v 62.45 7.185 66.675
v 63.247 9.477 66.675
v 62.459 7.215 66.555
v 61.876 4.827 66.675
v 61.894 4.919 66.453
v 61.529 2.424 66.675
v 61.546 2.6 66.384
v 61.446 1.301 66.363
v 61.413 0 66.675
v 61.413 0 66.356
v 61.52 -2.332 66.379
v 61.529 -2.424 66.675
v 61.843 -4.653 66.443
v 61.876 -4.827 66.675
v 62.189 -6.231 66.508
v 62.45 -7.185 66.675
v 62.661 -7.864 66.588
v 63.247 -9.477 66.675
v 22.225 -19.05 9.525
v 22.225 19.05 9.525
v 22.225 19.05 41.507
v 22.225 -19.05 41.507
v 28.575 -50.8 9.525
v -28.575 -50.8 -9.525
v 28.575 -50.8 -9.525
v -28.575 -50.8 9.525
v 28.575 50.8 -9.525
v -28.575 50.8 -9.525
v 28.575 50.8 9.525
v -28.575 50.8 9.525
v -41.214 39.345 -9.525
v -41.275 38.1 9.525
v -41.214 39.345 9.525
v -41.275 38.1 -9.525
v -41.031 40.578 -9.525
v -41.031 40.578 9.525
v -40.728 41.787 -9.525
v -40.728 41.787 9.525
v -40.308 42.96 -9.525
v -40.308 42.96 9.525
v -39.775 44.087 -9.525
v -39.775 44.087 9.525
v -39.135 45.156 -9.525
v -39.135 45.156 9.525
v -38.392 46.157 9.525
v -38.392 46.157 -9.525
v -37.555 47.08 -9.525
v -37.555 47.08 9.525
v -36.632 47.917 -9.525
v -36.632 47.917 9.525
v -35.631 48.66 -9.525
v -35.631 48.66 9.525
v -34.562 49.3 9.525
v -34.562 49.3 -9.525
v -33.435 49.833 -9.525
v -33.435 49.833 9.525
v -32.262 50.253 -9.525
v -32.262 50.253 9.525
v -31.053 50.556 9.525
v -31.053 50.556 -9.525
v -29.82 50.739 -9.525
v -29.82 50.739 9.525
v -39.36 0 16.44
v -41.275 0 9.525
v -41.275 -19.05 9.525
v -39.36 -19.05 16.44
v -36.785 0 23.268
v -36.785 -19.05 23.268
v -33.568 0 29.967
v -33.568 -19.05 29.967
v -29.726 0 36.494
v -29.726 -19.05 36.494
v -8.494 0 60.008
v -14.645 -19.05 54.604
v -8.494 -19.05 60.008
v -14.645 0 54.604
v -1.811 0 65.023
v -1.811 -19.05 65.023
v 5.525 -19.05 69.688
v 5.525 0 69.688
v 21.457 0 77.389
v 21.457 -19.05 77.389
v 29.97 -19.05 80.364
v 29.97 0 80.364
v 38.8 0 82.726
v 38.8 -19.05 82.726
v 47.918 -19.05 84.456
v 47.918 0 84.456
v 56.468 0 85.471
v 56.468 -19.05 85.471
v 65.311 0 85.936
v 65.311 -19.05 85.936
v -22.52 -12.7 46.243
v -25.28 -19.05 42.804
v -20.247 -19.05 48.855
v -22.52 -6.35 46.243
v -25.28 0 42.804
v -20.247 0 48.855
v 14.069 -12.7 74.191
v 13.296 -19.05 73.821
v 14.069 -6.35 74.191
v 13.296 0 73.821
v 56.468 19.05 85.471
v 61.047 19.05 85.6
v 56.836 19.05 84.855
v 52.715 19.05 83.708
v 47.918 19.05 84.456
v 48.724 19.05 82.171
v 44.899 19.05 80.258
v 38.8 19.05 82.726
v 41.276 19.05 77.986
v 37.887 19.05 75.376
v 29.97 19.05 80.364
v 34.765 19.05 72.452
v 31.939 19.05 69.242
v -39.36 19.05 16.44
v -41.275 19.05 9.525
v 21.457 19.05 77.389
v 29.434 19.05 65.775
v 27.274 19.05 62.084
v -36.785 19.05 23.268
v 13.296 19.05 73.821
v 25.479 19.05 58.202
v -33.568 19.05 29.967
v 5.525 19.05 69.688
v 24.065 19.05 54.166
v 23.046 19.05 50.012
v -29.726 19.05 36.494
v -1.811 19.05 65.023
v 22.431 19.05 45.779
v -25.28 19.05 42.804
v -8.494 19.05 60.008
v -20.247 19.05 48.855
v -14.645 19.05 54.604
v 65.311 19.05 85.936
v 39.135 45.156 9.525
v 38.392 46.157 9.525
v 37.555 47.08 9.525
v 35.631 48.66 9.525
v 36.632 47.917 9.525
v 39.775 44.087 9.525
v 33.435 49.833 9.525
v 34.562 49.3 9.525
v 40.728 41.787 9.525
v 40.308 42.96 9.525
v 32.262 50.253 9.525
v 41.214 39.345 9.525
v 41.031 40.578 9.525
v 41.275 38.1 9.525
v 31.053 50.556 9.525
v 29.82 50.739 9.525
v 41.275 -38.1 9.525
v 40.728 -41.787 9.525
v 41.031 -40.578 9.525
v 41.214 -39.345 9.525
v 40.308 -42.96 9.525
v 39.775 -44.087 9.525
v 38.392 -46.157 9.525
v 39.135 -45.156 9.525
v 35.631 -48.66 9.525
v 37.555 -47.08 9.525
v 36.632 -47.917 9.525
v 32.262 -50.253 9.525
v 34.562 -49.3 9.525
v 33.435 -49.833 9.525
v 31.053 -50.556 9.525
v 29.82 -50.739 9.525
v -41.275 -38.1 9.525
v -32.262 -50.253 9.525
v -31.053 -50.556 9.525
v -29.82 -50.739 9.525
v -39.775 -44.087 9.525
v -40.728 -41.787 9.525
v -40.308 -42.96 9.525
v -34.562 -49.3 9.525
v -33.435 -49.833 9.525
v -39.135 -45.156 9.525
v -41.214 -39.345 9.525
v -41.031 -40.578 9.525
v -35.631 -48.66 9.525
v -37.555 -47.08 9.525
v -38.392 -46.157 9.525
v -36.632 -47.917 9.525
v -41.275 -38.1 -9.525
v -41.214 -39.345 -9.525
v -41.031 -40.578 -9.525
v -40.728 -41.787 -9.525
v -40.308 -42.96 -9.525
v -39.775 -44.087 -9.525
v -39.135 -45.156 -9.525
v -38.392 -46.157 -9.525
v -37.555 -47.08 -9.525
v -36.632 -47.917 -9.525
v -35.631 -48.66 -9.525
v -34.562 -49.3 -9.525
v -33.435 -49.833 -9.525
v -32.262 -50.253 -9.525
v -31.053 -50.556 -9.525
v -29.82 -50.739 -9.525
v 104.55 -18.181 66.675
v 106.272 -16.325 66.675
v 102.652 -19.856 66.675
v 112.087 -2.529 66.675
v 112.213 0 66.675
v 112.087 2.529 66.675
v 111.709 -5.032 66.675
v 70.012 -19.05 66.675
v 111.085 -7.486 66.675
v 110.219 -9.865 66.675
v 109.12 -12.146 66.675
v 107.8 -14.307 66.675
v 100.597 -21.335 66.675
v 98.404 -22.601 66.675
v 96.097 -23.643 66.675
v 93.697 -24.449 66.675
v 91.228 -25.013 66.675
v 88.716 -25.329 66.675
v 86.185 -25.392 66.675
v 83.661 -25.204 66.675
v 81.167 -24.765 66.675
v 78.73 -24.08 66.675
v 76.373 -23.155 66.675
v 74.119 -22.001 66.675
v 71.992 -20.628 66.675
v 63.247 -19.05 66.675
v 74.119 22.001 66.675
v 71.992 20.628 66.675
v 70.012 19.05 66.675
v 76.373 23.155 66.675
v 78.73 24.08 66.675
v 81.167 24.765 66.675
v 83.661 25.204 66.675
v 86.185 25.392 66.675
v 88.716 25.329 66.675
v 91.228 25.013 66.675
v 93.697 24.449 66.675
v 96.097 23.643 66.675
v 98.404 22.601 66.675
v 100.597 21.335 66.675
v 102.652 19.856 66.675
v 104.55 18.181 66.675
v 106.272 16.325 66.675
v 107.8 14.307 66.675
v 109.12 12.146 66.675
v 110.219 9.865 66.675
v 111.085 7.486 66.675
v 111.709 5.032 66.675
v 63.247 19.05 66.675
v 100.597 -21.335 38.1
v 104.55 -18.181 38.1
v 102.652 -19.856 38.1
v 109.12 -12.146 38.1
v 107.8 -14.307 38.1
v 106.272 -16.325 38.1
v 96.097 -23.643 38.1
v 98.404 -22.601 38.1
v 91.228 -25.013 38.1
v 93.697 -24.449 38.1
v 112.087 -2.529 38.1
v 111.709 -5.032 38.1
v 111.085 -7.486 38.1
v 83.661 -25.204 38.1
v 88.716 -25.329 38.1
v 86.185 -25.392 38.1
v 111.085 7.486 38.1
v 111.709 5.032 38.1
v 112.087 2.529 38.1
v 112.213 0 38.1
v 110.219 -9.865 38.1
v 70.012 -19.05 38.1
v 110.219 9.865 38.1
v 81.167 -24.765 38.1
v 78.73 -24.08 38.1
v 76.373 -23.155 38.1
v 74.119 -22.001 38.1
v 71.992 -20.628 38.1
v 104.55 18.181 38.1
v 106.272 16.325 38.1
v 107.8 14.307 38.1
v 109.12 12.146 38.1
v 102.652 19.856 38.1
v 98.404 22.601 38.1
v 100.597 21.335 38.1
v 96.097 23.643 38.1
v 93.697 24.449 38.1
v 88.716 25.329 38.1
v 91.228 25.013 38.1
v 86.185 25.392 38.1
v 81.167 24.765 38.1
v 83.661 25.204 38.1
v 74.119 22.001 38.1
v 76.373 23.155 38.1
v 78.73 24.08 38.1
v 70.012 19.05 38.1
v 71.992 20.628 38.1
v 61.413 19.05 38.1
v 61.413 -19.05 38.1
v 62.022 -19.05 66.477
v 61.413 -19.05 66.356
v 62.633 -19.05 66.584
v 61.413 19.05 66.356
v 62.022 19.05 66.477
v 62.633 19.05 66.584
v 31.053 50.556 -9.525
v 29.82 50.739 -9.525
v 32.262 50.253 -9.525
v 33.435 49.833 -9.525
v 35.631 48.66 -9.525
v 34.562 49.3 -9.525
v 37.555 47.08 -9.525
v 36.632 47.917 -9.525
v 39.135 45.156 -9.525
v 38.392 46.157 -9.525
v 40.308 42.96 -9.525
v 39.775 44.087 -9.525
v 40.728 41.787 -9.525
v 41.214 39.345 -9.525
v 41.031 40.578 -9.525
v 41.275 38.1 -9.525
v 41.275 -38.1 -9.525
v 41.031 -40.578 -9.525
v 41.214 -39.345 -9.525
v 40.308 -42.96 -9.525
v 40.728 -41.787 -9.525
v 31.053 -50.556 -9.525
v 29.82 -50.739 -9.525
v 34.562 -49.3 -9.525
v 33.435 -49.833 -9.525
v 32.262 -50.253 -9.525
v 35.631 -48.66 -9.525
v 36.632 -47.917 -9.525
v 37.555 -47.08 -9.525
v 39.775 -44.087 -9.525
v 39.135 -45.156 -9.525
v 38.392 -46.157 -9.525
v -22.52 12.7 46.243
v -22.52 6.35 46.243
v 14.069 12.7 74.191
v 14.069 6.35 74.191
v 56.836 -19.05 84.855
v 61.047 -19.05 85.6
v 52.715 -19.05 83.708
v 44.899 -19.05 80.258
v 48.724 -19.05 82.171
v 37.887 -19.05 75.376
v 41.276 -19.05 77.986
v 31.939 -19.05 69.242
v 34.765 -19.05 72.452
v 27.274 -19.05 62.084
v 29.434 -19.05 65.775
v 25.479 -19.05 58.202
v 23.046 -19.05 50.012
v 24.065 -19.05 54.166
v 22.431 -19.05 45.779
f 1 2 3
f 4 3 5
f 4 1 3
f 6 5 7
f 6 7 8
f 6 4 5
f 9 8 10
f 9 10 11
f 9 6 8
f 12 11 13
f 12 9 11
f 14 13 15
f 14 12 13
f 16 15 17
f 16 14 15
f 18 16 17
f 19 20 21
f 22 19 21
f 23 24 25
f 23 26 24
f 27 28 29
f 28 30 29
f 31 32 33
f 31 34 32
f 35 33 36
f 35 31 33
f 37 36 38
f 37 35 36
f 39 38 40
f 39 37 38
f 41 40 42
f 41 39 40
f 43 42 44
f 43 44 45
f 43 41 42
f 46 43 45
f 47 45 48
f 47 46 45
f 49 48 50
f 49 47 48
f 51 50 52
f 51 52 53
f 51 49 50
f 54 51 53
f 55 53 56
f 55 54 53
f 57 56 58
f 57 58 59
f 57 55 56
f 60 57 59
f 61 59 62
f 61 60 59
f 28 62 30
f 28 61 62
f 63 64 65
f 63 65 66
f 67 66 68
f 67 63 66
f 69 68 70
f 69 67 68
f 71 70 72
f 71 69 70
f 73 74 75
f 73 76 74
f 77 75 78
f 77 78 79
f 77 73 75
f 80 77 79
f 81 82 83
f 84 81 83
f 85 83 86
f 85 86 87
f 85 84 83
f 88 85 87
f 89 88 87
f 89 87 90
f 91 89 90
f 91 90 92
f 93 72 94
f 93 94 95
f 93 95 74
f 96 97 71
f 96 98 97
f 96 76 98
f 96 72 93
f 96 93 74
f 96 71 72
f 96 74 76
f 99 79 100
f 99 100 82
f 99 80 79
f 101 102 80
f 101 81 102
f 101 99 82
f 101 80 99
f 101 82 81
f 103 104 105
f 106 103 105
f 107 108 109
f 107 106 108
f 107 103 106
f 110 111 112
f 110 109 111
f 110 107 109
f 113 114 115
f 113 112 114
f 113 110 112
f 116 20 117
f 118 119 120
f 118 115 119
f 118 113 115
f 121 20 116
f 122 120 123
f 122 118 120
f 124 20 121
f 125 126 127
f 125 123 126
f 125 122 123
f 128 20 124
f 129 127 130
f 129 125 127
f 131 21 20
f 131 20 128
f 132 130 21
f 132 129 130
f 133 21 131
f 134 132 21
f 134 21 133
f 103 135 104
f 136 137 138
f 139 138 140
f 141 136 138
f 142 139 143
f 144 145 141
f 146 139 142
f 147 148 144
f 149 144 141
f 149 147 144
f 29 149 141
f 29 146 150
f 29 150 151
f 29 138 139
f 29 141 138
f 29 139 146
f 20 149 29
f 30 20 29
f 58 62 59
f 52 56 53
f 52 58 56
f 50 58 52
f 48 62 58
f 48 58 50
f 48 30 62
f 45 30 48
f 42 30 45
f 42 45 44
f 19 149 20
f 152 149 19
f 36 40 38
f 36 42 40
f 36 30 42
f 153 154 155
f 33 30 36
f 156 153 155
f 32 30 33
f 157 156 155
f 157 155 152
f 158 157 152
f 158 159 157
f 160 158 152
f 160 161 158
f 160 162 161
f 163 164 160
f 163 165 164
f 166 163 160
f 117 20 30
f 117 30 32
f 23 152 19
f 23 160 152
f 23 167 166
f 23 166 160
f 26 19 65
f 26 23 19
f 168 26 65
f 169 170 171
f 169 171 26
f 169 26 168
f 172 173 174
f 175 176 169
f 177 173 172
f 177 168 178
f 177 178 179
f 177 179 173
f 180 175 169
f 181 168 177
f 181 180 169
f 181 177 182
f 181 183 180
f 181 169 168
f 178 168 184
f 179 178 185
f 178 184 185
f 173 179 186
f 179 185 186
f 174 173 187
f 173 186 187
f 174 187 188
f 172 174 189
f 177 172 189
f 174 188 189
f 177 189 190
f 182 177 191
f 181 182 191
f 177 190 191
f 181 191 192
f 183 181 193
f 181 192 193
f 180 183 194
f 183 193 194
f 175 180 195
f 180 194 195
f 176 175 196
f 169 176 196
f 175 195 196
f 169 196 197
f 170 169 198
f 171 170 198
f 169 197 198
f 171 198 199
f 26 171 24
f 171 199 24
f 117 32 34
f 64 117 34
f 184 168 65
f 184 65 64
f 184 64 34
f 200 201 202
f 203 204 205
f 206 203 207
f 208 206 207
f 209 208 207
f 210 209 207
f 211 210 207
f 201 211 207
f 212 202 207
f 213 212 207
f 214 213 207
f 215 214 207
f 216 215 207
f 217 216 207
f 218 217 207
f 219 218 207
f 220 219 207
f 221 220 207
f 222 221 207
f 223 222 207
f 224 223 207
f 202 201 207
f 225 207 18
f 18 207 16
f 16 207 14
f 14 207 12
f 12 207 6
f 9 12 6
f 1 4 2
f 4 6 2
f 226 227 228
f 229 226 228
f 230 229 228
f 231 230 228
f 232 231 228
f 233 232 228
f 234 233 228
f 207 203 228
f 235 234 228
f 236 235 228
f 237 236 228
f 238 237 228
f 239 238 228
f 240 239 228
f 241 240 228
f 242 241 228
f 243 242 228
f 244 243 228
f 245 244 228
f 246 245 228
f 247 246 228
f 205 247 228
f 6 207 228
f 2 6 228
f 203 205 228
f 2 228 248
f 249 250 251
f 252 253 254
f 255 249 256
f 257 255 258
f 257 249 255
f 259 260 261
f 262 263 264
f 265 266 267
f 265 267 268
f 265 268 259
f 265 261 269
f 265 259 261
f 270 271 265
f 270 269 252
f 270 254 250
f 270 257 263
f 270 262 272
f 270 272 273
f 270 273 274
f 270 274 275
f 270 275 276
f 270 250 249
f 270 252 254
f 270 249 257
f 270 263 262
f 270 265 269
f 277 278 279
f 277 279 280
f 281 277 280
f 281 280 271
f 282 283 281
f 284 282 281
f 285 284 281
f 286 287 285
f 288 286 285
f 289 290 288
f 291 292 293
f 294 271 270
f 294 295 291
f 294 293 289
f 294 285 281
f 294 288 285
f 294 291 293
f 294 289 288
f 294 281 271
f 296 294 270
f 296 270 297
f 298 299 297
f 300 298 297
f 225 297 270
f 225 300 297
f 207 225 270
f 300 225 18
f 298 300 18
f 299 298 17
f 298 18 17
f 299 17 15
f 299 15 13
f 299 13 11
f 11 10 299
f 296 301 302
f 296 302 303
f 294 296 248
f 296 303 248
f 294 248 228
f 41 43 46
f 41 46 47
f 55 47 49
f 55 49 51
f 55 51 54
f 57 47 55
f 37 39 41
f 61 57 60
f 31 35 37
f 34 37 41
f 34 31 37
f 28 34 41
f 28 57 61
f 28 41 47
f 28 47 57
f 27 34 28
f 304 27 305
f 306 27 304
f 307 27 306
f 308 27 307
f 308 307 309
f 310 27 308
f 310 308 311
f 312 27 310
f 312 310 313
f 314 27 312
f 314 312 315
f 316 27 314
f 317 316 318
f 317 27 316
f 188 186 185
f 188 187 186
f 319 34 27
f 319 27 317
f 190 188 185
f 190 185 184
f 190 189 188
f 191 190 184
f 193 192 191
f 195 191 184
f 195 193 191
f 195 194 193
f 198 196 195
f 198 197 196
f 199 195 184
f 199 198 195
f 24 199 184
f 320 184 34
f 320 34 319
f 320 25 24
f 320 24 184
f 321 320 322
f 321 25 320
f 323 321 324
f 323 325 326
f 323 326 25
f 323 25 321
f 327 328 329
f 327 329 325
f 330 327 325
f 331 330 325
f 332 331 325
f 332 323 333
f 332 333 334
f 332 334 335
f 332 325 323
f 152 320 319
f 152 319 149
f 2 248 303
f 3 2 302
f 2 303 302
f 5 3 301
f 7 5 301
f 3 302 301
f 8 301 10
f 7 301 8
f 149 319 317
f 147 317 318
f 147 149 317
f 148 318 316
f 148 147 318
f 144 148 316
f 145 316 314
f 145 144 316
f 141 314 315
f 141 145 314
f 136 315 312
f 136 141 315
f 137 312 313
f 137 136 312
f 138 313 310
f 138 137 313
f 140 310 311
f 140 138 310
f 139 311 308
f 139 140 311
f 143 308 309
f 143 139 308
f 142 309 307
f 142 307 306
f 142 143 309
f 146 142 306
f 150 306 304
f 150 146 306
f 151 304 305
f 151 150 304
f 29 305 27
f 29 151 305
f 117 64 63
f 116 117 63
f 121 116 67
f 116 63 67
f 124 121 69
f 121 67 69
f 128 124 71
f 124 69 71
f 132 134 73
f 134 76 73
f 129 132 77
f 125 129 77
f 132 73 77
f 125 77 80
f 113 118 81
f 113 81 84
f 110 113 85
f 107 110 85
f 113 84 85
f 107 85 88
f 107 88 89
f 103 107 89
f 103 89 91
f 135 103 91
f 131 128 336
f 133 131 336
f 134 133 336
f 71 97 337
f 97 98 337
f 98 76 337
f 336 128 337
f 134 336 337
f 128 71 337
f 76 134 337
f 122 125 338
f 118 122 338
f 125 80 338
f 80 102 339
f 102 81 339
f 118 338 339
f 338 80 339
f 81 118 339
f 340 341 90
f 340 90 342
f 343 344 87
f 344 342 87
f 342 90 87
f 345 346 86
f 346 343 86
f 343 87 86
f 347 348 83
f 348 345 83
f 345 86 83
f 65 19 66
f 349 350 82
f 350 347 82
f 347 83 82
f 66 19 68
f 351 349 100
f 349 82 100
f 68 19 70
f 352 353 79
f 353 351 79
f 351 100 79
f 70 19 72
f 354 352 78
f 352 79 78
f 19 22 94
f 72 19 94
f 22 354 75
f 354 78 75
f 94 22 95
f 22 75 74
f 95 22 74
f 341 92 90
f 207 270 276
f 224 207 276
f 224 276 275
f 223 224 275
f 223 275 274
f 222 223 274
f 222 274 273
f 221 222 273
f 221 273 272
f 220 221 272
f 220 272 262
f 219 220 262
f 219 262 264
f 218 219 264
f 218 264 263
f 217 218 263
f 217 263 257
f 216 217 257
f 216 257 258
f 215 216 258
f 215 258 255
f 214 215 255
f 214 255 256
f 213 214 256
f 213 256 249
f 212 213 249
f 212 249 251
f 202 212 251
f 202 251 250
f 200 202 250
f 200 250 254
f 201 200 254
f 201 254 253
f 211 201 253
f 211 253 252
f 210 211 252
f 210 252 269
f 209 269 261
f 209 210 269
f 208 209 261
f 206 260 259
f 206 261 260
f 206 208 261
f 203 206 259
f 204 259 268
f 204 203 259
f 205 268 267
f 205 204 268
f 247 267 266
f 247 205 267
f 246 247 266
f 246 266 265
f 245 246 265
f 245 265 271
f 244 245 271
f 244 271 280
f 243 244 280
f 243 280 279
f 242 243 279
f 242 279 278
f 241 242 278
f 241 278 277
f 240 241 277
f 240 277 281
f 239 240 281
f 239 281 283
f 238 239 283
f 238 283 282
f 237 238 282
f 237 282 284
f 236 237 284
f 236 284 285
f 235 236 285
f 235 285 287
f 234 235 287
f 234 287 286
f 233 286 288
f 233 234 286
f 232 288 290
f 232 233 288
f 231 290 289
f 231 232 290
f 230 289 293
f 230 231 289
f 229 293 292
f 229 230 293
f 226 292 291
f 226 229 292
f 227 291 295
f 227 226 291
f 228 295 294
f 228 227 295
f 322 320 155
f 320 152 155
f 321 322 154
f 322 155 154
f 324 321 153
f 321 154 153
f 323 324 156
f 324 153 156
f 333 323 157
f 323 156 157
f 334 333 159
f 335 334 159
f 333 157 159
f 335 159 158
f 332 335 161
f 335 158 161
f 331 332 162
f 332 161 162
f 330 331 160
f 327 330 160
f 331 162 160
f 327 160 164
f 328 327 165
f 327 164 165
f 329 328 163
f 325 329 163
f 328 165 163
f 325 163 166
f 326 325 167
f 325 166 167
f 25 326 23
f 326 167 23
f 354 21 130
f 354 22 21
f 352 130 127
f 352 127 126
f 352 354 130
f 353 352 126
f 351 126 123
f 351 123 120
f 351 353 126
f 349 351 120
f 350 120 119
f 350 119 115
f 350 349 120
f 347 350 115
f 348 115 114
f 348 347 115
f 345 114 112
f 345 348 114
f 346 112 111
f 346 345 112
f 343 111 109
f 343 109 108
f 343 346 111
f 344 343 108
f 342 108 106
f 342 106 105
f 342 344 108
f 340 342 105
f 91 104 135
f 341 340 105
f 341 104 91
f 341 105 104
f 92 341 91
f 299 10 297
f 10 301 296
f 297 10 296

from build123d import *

# Parameters (mm, degrees)
F1_DEPTH = 50.8
F2_DEPTH = 19.05
F0_W     = 25.4
F0_H     = 28.575
F4_R     = 12.7


with BuildPart() as f1:
    # F0 (on Front) → F1 (new body, symmetric)
    with BuildSketch(Plane.XZ):
        Polygon((-41.275, 9.525), (-41.275, -9.525), (41.275, -9.525), (41.275, 9.525), (22.225, 9.525), align=None)
    extrude(amount=F1_DEPTH, both=True)

    # F0 (on Front) → F2 (join, symmetric)
    with BuildSketch(Plane.XZ):
        with BuildLine():
            ThreePointArc((63.247054, 66.675), (62.327, 66.532463), (61.412787, 66.356304))
            Line((61.412787, 66.356304), (61.412787, 38.1))
            Line((61.412787, 38.1), (86.812787, 38.1))
            Line((86.812787, 38.1), (86.812787, 66.675))
            Line((86.812787, 66.675), (63.247054, 66.675))
        make_face()
        with BuildLine():
            add(Edge.make_bspline(
                [(-41.275, 9.525), (-32.496811, 48.148703), (7.801794, 84.771397), (65.310965, 85.936444)],
                knots=[0, 0, 0, 0, 131.233963, 131.233963, 131.233963, 131.233963], degree=3))
            Line((-41.275, 9.525), (22.225, 9.525))
            Line((22.225, 9.525), (22.225, 41.507378))
            ThreePointArc((22.225, 41.507378), (34.765489, 72.452258), (65.310965, 85.936444))
        make_face()
    extrude(amount=F2_DEPTH, both=True)

    # F0 (on Front) → F3 (revolve)
    with BuildSketch(Plane.XZ):
        with Locations((99.512787, 52.3875)):
            Rectangle(F0_W, F0_H)
    revolve(axis=Axis((86.812787, 0, 62.028689), (0, 0, 1)))

    # F4
    f4_edges = [f1.edges().sort_by_distance(p)[0] for p in [
        (-41.275, -50.8, 0),
        (41.275, -50.8, 0),
        (41.275, 50.8, 0),
        (-41.275, 50.8, 0),
    ]]
    fillet(f4_edges, radius=F4_R)


solid = f1.part
